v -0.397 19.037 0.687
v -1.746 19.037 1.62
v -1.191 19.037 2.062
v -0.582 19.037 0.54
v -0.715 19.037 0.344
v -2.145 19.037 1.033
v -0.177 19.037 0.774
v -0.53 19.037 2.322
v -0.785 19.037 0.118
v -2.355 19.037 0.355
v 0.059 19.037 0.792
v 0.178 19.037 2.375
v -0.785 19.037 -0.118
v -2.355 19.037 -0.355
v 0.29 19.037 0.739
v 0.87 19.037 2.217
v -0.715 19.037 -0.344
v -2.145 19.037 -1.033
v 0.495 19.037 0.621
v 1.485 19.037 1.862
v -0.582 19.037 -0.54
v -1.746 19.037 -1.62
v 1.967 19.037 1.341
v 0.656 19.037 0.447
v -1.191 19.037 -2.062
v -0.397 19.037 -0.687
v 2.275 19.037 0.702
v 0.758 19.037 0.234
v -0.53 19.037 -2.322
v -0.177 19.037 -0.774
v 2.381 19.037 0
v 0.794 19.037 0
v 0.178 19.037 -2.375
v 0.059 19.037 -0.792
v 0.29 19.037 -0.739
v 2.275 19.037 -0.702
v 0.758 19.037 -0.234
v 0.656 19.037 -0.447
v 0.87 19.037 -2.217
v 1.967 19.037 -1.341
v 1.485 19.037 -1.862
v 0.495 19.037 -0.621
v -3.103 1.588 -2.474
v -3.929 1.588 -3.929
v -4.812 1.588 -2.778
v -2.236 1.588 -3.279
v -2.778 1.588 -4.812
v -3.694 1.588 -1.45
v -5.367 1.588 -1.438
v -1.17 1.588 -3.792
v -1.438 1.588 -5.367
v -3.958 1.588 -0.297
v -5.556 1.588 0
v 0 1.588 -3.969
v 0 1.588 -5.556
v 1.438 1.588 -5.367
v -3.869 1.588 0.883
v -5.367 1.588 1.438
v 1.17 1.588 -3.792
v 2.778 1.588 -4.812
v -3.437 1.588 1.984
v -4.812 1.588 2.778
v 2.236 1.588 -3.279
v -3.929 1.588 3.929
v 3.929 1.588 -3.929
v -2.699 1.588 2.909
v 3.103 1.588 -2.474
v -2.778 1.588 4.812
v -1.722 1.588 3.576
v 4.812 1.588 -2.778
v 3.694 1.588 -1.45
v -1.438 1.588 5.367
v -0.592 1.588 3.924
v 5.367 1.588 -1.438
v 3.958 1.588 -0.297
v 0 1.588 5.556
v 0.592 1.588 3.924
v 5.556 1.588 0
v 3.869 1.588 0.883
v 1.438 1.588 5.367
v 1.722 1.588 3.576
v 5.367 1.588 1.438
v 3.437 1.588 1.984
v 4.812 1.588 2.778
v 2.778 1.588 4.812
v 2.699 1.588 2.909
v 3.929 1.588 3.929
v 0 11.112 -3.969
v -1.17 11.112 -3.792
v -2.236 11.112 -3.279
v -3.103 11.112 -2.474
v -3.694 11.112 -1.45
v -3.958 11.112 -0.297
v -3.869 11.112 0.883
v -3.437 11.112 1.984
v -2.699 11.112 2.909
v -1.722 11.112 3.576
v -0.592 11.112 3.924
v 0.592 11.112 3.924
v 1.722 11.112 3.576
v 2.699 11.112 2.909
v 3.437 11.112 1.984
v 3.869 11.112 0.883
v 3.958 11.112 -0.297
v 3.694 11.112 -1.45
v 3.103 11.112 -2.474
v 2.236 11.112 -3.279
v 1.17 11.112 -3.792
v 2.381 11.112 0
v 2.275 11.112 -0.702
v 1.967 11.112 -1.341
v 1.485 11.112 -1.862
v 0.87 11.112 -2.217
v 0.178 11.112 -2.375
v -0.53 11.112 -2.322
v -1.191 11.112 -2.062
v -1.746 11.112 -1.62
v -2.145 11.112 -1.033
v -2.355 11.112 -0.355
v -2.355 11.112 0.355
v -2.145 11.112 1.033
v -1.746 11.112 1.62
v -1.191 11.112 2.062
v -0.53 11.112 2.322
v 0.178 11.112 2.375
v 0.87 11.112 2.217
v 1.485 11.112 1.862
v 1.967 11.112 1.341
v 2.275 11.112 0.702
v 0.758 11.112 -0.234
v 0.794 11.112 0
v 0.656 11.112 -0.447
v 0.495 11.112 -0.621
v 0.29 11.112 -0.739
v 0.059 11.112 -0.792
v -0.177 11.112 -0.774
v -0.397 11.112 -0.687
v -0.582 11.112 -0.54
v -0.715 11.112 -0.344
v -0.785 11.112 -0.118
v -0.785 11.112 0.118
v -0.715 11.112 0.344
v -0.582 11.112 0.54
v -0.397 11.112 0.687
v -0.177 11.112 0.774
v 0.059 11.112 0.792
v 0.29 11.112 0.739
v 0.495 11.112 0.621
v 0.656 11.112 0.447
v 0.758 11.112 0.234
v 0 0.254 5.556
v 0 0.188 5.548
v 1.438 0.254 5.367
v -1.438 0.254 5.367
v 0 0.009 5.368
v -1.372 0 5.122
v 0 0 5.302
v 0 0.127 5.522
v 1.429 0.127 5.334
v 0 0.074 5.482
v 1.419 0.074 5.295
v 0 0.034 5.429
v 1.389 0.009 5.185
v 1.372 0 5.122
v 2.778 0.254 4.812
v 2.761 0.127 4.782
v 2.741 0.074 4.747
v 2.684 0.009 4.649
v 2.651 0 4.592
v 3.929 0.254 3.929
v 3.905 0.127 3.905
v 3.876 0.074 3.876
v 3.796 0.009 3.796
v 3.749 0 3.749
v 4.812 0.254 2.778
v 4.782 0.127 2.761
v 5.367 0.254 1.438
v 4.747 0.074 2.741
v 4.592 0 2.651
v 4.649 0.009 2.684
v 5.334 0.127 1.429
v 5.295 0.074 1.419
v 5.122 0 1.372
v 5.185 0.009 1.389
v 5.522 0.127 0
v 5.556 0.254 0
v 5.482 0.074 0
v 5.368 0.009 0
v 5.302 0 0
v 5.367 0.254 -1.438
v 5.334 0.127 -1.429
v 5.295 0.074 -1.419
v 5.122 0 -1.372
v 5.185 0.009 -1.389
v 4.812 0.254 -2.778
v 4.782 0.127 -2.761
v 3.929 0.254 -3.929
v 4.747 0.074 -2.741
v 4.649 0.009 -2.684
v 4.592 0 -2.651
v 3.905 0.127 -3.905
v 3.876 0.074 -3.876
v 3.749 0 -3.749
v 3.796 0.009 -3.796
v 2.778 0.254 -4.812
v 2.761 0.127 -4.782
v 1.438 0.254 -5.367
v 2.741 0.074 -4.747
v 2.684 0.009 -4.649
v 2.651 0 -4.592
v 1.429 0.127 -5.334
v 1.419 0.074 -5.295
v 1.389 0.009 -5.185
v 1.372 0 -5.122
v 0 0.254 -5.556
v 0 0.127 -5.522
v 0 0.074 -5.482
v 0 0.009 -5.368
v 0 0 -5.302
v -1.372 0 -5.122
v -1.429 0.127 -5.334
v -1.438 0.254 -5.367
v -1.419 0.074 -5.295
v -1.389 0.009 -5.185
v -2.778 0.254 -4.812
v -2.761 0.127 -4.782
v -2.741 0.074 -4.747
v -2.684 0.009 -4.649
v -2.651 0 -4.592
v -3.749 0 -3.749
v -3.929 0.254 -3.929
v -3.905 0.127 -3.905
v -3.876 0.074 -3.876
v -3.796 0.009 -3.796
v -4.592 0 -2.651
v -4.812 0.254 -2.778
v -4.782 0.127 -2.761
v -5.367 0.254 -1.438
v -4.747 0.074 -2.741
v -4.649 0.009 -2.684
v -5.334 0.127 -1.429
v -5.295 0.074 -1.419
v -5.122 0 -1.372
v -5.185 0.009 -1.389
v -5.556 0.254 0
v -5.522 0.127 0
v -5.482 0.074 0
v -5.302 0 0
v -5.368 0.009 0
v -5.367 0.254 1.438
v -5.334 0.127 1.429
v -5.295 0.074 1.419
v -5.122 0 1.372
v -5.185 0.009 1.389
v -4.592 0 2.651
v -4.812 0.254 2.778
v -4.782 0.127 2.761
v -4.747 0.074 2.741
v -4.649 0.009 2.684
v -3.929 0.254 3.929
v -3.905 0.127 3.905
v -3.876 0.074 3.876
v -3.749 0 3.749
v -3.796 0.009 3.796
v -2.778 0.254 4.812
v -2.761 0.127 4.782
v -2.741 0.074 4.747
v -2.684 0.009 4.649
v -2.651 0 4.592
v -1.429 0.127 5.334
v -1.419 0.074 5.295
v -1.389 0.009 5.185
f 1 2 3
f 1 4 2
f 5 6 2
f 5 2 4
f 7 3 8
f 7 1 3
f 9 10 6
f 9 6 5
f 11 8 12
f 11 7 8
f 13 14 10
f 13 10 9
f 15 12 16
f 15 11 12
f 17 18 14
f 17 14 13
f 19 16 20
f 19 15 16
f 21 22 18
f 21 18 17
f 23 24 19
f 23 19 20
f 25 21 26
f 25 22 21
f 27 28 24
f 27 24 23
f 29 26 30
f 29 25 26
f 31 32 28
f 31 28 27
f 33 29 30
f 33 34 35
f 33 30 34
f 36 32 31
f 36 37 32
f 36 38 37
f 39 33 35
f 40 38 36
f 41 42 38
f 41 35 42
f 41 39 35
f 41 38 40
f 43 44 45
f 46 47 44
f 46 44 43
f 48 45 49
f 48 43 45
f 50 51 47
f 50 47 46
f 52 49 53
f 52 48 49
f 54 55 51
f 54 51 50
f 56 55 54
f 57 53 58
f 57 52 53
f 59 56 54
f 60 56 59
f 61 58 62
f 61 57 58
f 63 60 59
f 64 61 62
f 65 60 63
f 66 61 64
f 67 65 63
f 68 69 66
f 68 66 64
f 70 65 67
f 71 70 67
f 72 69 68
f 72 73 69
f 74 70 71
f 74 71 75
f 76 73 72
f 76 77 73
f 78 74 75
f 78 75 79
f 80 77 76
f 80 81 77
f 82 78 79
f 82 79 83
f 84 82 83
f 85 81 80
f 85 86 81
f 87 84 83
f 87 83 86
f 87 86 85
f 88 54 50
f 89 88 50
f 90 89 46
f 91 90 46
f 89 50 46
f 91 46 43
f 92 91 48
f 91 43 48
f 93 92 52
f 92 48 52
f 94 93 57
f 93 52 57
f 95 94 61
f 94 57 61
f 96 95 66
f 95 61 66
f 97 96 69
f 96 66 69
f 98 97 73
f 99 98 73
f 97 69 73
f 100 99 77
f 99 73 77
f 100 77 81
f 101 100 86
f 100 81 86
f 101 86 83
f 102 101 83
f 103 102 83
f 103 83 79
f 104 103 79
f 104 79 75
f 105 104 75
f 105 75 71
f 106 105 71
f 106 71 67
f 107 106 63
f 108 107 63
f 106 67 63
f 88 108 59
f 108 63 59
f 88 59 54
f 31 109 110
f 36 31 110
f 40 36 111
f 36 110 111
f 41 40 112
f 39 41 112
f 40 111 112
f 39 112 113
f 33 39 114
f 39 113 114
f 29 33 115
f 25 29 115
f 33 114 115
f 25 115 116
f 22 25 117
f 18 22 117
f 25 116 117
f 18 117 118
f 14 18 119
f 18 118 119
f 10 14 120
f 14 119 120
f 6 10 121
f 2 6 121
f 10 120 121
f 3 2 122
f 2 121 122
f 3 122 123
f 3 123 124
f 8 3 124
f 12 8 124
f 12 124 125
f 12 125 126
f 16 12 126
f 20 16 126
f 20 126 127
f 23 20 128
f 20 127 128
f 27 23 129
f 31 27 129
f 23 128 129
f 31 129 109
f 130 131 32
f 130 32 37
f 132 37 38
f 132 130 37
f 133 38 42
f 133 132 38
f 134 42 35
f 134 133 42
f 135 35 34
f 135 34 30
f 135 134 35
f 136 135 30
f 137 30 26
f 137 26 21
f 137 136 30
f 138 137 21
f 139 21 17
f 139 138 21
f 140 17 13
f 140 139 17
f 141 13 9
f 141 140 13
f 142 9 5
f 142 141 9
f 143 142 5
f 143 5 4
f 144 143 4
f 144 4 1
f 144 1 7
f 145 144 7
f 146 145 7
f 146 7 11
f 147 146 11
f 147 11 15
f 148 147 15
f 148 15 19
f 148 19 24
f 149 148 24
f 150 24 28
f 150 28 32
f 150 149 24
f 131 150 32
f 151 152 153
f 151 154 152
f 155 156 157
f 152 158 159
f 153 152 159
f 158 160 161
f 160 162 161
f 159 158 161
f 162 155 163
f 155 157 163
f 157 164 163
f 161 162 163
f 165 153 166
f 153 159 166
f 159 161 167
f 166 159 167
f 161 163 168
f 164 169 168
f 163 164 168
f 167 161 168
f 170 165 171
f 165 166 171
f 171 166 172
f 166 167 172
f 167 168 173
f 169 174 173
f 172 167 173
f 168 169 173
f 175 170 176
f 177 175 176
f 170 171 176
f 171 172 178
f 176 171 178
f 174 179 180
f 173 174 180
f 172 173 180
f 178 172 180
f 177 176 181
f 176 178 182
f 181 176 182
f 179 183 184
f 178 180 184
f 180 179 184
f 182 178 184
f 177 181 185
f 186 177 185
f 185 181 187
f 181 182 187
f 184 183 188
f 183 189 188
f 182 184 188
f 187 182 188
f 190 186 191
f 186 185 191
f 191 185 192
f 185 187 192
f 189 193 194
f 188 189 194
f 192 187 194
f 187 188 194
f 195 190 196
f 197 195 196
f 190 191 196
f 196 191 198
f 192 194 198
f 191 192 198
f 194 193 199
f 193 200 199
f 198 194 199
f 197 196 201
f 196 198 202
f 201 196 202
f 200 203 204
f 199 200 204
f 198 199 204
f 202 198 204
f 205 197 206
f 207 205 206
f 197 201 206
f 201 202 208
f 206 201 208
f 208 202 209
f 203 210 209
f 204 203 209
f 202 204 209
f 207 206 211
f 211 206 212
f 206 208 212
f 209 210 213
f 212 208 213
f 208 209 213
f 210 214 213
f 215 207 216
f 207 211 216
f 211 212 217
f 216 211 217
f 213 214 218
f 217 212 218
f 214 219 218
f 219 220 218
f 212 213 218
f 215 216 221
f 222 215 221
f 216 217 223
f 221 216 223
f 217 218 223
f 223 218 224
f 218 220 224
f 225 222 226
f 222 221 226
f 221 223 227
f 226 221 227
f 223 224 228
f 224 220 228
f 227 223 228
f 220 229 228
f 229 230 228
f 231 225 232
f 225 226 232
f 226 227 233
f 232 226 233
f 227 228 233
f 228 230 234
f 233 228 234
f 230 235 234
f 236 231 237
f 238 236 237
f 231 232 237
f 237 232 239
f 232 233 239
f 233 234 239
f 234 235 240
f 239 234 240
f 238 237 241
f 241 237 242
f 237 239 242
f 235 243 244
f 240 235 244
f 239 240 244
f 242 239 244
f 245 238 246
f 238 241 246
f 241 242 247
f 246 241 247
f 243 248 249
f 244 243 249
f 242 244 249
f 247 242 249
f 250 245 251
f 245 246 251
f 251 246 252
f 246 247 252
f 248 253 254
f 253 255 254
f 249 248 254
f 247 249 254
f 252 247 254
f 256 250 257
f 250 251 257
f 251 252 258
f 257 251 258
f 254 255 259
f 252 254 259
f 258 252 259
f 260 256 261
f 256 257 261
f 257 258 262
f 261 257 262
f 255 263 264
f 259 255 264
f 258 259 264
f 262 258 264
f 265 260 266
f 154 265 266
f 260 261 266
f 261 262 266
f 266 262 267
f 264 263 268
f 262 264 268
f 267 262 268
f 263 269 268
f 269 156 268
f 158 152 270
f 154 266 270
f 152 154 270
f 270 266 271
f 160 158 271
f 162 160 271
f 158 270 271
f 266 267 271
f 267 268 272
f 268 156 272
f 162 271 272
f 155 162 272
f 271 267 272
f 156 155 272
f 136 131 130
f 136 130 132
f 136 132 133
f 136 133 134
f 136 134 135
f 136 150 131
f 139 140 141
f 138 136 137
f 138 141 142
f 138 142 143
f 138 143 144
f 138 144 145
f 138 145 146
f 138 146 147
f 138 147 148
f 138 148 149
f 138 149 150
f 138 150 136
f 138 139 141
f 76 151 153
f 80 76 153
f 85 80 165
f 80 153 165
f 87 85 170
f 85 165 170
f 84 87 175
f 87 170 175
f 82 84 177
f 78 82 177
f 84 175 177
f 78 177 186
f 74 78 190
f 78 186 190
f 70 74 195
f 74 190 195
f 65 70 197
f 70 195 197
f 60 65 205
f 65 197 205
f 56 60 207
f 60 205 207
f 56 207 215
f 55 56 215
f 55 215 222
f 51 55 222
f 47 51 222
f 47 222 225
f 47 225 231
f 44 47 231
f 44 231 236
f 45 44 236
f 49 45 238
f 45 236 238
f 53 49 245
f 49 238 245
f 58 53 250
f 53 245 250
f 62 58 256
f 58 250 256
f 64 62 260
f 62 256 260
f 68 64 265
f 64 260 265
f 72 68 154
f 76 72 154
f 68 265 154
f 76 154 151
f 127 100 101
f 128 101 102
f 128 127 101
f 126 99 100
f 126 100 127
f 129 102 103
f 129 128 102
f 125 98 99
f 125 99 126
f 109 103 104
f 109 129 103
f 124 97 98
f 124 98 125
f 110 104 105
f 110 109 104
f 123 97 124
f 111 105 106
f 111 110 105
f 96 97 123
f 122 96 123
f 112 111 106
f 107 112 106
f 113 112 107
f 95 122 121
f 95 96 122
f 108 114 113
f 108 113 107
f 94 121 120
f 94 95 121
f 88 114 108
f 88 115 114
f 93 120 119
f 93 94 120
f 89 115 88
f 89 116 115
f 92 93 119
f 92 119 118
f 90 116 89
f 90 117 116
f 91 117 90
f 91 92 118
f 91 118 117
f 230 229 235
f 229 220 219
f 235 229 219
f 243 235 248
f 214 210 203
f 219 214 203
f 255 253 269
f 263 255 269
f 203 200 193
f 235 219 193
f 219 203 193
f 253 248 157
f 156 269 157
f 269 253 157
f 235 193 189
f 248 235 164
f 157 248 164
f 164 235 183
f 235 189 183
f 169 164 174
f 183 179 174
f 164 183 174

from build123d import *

# Parameters (mm, degrees)
SKETCH1_R           = 5.55625
BOSS_EXTRUDE1_DEPTH = 1.5875
SKETCH2_R           = 3.96875
BOSS_EXTRUDE2_DEPTH = 9.525
SKETCH3_R           = 2.38125
SKETCH3_R_2         = 0.79375
EXTRUDE_THIN2_DEPTH = 7.9248
FILLET1_R           = 0.254


with BuildPart() as part:
    # Sketch1 → Boss-Extrude1 (new body)
    with BuildSketch(Plane(origin=(0, 0, 0), x_dir=(1, 0, 0), z_dir=(0, 1, 0))):
        Circle(SKETCH1_R)
    extrude(amount=BOSS_EXTRUDE1_DEPTH)

    # Sketch2 → Boss-Extrude2 (add)
    with BuildSketch(Plane(origin=(0, 1.5875, 0), x_dir=(1, 0, 0), z_dir=(0, 1, 0))):
        Circle(SKETCH2_R)
    extrude(amount=BOSS_EXTRUDE2_DEPTH)

    # Sketch3 → Extrude-Thin2 (add)
    with BuildSketch(Plane(origin=(0, 11.1125, 0), x_dir=(1, 0, 0), z_dir=(0, 1, 0))):
        Circle(SKETCH3_R)
        Circle(SKETCH3_R_2, mode=Mode.SUBTRACT)
    extrude(amount=EXTRUDE_THIN2_DEPTH)

    # Fillet1
    fillet1_edges = [part.edges().sort_by_distance(p)[0] for p in [
        (-5.55625, 0, 0),
    ]]
    fillet(fillet1_edges, radius=FILLET1_R)


solid = part.part
